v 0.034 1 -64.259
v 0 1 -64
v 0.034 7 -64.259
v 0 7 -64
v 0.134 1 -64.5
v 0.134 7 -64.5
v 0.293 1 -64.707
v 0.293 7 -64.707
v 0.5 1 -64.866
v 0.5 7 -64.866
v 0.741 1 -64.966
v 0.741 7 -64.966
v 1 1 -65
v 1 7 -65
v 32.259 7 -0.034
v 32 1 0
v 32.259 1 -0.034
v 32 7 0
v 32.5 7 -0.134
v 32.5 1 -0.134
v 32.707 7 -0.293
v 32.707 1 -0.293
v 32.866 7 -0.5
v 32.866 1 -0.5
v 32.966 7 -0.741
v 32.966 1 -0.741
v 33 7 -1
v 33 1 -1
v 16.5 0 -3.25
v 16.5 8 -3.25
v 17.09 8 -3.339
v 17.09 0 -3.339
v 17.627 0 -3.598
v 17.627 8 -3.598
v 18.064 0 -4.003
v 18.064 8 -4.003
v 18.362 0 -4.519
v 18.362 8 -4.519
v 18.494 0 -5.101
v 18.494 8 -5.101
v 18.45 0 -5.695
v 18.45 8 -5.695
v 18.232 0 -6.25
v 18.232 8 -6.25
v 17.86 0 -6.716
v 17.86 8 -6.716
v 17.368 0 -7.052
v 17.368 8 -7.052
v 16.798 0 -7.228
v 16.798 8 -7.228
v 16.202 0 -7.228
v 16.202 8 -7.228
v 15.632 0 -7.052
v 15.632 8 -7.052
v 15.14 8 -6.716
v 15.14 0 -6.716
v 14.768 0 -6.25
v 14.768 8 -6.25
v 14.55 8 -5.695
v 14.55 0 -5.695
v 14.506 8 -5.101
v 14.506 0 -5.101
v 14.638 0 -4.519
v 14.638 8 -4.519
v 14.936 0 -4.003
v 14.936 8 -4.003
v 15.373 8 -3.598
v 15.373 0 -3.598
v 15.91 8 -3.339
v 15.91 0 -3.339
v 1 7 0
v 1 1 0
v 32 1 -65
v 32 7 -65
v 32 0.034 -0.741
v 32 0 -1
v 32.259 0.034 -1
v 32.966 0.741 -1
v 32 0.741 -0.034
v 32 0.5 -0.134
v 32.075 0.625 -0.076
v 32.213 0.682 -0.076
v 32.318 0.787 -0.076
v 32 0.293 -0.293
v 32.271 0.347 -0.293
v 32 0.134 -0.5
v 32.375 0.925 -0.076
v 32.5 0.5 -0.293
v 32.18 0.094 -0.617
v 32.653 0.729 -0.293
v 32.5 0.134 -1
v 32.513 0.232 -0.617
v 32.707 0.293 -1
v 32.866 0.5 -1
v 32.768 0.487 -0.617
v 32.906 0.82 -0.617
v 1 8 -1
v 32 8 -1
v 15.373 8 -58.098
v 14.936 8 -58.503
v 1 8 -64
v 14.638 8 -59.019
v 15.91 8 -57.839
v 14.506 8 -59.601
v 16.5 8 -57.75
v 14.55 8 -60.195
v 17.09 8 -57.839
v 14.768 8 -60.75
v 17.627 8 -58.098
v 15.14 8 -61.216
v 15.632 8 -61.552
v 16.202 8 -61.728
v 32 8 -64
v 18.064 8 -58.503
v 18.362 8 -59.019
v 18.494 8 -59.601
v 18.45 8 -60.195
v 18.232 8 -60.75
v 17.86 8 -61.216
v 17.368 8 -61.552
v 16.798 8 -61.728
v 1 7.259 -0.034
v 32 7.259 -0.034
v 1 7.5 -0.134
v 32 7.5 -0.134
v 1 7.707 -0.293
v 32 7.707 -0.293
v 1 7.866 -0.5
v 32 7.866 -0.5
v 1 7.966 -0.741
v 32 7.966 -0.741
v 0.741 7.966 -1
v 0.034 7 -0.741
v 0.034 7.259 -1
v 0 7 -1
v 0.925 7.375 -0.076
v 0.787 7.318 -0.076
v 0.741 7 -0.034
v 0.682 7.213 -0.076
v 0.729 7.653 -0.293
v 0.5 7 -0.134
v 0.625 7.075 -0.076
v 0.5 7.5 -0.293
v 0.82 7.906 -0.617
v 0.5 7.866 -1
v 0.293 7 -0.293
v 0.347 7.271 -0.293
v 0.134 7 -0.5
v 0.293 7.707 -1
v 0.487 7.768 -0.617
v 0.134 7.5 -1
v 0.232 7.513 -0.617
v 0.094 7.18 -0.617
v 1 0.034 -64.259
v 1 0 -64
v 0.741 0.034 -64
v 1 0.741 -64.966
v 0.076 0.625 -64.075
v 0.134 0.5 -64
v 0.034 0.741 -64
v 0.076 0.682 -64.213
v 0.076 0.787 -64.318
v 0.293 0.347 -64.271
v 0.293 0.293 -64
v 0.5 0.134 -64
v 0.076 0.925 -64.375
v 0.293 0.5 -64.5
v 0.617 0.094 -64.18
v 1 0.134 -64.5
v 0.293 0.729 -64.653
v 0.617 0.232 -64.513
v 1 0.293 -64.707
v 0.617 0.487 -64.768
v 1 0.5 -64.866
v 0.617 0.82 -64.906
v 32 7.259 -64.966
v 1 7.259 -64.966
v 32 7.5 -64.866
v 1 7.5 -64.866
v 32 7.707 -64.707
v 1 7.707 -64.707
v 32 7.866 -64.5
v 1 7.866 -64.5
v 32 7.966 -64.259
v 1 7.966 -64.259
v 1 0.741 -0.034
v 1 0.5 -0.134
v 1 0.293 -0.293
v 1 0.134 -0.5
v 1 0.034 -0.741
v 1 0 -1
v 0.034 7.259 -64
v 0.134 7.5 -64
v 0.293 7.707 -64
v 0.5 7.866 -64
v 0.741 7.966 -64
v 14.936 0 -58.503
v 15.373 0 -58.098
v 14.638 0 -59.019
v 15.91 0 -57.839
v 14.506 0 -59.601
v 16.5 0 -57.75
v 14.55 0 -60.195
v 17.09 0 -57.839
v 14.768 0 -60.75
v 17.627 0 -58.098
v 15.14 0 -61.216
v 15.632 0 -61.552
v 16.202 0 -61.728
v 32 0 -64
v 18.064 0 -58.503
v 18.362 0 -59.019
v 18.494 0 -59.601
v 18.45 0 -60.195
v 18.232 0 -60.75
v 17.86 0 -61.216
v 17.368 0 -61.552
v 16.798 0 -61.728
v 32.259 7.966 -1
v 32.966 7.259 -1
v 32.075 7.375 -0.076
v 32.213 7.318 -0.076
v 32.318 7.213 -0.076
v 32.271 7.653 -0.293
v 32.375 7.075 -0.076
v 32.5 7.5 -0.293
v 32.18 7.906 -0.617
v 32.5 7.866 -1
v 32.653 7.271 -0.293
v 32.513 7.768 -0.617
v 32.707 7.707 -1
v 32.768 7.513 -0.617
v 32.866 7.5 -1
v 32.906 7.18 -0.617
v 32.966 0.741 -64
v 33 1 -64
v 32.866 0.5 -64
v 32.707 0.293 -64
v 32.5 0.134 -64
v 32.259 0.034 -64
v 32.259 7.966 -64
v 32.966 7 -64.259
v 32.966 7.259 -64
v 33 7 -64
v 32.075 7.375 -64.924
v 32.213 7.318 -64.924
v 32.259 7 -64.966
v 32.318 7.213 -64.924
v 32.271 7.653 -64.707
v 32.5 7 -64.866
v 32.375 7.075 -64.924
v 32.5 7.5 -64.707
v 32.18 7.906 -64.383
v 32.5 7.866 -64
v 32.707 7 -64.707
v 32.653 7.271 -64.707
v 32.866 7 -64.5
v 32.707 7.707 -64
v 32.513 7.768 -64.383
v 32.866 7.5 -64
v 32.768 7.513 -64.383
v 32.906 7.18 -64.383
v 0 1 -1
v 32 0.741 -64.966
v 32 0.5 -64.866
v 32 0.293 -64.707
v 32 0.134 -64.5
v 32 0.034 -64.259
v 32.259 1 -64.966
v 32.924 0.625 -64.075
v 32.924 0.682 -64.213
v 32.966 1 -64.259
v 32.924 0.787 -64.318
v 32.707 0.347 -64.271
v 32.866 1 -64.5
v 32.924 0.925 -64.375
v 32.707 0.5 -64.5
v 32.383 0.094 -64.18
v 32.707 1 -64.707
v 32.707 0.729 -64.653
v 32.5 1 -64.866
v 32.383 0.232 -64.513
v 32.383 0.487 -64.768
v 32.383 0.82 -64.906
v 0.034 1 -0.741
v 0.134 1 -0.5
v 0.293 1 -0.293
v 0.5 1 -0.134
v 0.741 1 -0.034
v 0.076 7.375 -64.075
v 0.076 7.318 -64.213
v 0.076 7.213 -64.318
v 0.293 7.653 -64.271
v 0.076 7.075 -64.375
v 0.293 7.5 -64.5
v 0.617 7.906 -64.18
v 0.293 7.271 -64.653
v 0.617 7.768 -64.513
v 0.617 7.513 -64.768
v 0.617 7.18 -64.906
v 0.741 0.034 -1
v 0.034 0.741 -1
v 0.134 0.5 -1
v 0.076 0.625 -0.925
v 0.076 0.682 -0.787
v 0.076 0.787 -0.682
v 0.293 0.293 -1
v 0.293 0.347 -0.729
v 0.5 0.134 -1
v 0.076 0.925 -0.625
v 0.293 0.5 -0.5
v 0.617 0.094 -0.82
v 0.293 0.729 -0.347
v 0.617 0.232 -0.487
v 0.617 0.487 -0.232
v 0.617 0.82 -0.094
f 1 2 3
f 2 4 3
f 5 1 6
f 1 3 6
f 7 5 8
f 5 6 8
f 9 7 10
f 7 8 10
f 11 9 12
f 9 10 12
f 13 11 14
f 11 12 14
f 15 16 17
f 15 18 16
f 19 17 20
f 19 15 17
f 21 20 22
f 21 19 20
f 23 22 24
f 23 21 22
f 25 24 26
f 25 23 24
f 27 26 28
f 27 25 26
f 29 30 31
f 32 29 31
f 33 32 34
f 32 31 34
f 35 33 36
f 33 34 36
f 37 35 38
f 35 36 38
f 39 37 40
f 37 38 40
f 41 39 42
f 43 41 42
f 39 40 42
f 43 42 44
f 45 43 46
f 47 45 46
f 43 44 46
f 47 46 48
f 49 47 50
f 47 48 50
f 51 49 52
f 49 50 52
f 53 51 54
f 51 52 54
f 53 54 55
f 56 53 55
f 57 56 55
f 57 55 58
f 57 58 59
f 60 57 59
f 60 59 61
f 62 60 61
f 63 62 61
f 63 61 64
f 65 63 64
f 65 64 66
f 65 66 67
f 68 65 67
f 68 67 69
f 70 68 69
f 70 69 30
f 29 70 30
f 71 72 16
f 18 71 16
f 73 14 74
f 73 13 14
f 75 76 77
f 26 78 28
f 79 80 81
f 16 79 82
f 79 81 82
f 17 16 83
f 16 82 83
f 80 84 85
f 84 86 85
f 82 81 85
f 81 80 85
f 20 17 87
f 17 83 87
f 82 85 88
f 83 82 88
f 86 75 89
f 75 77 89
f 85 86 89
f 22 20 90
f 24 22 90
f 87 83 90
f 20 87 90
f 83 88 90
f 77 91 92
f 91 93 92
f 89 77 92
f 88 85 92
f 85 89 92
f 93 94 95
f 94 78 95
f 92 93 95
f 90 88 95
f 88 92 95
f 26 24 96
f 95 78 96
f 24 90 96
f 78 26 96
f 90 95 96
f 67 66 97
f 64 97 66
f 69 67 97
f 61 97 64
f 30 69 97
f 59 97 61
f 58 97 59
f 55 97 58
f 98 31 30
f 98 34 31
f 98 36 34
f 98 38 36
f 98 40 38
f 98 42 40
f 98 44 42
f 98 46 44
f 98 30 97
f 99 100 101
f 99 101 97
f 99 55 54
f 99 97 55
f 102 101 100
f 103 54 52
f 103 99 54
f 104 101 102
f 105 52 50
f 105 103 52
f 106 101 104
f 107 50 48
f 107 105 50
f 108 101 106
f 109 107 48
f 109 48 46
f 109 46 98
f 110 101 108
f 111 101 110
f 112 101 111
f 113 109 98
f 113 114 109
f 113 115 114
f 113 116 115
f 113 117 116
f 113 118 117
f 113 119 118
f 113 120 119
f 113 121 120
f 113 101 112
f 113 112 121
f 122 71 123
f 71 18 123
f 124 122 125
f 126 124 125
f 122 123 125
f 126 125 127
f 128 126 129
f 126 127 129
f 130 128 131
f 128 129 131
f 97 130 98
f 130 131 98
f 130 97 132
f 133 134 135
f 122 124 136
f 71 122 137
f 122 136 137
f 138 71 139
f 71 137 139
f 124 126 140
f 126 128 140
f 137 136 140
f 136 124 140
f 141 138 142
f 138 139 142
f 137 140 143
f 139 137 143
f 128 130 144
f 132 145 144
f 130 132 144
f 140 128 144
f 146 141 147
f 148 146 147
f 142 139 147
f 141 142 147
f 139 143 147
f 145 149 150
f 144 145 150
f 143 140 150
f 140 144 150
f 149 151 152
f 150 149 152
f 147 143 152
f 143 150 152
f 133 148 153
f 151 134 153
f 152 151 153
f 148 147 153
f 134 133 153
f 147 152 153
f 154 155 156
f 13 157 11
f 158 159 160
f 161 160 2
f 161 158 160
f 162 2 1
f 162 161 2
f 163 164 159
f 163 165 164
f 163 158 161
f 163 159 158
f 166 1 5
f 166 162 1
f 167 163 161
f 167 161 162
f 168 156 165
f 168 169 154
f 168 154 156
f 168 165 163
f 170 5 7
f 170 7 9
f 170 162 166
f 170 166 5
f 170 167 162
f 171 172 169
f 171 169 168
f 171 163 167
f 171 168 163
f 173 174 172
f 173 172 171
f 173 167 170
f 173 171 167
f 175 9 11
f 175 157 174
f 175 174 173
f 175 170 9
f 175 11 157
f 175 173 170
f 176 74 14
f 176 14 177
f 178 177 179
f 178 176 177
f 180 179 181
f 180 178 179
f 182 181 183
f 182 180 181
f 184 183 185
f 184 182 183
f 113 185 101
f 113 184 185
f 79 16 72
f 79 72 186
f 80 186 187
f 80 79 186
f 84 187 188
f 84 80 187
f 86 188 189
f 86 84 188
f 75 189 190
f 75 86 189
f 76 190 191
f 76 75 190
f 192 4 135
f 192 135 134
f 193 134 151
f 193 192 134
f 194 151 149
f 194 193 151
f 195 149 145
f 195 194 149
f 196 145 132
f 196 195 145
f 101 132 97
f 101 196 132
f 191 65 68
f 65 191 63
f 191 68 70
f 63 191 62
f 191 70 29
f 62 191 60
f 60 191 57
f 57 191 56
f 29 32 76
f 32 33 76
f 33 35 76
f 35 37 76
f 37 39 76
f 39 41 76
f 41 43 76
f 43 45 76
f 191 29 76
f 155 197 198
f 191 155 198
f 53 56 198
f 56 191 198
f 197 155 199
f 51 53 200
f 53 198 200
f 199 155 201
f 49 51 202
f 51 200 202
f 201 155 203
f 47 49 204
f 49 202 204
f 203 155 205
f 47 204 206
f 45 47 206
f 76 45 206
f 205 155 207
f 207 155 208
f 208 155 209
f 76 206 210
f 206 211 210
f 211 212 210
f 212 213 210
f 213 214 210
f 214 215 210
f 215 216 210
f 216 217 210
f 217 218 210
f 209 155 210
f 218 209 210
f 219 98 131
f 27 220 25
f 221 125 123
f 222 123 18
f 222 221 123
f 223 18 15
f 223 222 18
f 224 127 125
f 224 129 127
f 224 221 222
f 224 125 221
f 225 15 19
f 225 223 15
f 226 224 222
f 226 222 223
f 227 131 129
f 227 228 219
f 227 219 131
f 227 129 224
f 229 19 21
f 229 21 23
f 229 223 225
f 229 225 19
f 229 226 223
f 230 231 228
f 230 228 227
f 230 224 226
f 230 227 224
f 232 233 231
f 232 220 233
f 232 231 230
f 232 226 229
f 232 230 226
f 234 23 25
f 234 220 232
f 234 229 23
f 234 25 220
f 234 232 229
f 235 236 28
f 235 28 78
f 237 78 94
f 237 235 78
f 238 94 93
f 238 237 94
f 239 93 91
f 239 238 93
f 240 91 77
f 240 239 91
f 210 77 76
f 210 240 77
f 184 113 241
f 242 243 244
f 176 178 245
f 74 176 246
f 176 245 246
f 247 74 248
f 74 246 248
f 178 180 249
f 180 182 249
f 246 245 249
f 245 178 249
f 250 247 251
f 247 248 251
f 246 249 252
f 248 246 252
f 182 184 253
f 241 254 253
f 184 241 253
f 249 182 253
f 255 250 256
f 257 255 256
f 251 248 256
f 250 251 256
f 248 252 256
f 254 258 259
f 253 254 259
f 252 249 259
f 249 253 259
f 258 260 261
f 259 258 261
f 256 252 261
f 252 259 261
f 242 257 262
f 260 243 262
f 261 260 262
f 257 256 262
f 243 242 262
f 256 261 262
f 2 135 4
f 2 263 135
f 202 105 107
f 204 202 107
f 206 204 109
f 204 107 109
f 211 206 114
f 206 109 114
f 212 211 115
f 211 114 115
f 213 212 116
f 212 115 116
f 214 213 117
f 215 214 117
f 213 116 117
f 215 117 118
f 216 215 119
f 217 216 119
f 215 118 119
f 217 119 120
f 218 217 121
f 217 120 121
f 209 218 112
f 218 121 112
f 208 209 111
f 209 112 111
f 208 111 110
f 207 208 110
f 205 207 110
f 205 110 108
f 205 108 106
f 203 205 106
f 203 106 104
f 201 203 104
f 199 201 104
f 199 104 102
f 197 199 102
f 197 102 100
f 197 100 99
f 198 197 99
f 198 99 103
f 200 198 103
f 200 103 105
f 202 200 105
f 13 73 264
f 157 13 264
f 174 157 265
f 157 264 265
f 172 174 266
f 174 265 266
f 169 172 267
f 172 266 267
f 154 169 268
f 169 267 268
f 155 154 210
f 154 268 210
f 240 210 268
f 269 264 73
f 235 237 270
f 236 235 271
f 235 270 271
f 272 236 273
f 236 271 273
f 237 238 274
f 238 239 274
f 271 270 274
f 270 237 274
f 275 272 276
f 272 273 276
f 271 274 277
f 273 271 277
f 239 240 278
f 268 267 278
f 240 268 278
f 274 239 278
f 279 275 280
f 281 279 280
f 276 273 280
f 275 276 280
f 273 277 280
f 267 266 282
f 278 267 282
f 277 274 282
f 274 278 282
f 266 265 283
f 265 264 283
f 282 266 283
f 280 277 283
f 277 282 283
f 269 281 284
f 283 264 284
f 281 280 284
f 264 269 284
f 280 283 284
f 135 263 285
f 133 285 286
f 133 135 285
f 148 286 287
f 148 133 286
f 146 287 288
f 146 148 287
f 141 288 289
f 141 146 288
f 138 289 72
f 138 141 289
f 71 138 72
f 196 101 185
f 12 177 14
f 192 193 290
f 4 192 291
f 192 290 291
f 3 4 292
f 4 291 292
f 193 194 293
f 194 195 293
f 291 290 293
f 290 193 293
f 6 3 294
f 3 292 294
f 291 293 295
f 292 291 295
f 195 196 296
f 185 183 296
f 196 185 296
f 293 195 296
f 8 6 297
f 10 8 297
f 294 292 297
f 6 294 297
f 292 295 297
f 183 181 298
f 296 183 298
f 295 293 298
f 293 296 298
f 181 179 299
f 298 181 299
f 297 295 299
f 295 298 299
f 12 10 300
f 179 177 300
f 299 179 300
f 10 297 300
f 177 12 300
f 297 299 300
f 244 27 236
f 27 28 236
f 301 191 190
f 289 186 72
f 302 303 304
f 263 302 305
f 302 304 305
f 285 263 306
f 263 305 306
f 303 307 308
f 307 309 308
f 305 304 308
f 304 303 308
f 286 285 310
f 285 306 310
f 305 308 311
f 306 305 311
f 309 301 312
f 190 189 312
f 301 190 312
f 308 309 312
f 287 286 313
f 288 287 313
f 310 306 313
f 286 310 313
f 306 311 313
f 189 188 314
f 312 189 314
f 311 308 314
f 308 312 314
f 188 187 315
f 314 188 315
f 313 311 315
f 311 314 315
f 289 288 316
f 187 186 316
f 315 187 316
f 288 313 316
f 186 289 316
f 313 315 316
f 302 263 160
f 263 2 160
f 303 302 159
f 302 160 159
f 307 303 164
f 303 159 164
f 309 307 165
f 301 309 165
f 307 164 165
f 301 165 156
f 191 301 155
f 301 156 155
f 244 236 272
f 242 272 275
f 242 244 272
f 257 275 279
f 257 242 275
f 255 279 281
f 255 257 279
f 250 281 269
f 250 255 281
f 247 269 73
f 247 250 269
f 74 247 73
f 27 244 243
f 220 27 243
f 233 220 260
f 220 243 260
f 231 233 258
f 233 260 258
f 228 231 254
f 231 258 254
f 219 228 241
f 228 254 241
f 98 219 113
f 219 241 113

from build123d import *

# Parameters (mm, degrees)
CROQUIS1_W              = 33
CROQUIS1_H              = 65
SALIENTE_EXTRUIR1_DEPTH = 8
REDONDEO1_R             = 1
CROQUIS2_R              = 2
CORTAR_EXTRUIR1_DEPTH   = 74.334848469


with BuildPart() as part:
    # Croquis1 → Saliente-Extruir1 (new body)
    with BuildSketch(Plane(origin=(0, 0, 0), x_dir=(1, 0, 0), z_dir=(0, 1, 0))):
        with Locations((16.5, 32.5)):
            Rectangle(CROQUIS1_W, CROQUIS1_H)
    extrude(amount=SALIENTE_EXTRUIR1_DEPTH)

    # Redondeo1
    redondeo1_edges = [part.edges().sort_by_distance(p)[0] for p in [
        (33, 8, -32.5),
        (16.5, 8, -65),
        (0, 8, -32.5),
        (16.5, 0, -65),
        (33, 0, -32.5),
        (16.5, 0, 0),
        (0, 0, -32.5),
        (16.5, 8, 0),
        (0, 4, -65),
        (33, 4, -65),
        (33, 4, 0),
        (0, 4, 0),
    ]]
    fillet(redondeo1_edges, radius=REDONDEO1_R)

    # Croquis2 → Cortar-Extruir1 (cut, through all)
    with BuildSketch(Plane(origin=(0, 8, 0), x_dir=(1, 0, 0), z_dir=(0, 1, 0))):
        with Locations(Location((16.5, 5.25, 0), (0, 0, 270))):
            Circle(CROQUIS2_R)
        with Locations(Location((16.5, 59.75, 0), (0, 0, 270))):
            Circle(CROQUIS2_R)
    extrude(amount=-CORTAR_EXTRUIR1_DEPTH, mode=Mode.SUBTRACT)


solid = part.part
